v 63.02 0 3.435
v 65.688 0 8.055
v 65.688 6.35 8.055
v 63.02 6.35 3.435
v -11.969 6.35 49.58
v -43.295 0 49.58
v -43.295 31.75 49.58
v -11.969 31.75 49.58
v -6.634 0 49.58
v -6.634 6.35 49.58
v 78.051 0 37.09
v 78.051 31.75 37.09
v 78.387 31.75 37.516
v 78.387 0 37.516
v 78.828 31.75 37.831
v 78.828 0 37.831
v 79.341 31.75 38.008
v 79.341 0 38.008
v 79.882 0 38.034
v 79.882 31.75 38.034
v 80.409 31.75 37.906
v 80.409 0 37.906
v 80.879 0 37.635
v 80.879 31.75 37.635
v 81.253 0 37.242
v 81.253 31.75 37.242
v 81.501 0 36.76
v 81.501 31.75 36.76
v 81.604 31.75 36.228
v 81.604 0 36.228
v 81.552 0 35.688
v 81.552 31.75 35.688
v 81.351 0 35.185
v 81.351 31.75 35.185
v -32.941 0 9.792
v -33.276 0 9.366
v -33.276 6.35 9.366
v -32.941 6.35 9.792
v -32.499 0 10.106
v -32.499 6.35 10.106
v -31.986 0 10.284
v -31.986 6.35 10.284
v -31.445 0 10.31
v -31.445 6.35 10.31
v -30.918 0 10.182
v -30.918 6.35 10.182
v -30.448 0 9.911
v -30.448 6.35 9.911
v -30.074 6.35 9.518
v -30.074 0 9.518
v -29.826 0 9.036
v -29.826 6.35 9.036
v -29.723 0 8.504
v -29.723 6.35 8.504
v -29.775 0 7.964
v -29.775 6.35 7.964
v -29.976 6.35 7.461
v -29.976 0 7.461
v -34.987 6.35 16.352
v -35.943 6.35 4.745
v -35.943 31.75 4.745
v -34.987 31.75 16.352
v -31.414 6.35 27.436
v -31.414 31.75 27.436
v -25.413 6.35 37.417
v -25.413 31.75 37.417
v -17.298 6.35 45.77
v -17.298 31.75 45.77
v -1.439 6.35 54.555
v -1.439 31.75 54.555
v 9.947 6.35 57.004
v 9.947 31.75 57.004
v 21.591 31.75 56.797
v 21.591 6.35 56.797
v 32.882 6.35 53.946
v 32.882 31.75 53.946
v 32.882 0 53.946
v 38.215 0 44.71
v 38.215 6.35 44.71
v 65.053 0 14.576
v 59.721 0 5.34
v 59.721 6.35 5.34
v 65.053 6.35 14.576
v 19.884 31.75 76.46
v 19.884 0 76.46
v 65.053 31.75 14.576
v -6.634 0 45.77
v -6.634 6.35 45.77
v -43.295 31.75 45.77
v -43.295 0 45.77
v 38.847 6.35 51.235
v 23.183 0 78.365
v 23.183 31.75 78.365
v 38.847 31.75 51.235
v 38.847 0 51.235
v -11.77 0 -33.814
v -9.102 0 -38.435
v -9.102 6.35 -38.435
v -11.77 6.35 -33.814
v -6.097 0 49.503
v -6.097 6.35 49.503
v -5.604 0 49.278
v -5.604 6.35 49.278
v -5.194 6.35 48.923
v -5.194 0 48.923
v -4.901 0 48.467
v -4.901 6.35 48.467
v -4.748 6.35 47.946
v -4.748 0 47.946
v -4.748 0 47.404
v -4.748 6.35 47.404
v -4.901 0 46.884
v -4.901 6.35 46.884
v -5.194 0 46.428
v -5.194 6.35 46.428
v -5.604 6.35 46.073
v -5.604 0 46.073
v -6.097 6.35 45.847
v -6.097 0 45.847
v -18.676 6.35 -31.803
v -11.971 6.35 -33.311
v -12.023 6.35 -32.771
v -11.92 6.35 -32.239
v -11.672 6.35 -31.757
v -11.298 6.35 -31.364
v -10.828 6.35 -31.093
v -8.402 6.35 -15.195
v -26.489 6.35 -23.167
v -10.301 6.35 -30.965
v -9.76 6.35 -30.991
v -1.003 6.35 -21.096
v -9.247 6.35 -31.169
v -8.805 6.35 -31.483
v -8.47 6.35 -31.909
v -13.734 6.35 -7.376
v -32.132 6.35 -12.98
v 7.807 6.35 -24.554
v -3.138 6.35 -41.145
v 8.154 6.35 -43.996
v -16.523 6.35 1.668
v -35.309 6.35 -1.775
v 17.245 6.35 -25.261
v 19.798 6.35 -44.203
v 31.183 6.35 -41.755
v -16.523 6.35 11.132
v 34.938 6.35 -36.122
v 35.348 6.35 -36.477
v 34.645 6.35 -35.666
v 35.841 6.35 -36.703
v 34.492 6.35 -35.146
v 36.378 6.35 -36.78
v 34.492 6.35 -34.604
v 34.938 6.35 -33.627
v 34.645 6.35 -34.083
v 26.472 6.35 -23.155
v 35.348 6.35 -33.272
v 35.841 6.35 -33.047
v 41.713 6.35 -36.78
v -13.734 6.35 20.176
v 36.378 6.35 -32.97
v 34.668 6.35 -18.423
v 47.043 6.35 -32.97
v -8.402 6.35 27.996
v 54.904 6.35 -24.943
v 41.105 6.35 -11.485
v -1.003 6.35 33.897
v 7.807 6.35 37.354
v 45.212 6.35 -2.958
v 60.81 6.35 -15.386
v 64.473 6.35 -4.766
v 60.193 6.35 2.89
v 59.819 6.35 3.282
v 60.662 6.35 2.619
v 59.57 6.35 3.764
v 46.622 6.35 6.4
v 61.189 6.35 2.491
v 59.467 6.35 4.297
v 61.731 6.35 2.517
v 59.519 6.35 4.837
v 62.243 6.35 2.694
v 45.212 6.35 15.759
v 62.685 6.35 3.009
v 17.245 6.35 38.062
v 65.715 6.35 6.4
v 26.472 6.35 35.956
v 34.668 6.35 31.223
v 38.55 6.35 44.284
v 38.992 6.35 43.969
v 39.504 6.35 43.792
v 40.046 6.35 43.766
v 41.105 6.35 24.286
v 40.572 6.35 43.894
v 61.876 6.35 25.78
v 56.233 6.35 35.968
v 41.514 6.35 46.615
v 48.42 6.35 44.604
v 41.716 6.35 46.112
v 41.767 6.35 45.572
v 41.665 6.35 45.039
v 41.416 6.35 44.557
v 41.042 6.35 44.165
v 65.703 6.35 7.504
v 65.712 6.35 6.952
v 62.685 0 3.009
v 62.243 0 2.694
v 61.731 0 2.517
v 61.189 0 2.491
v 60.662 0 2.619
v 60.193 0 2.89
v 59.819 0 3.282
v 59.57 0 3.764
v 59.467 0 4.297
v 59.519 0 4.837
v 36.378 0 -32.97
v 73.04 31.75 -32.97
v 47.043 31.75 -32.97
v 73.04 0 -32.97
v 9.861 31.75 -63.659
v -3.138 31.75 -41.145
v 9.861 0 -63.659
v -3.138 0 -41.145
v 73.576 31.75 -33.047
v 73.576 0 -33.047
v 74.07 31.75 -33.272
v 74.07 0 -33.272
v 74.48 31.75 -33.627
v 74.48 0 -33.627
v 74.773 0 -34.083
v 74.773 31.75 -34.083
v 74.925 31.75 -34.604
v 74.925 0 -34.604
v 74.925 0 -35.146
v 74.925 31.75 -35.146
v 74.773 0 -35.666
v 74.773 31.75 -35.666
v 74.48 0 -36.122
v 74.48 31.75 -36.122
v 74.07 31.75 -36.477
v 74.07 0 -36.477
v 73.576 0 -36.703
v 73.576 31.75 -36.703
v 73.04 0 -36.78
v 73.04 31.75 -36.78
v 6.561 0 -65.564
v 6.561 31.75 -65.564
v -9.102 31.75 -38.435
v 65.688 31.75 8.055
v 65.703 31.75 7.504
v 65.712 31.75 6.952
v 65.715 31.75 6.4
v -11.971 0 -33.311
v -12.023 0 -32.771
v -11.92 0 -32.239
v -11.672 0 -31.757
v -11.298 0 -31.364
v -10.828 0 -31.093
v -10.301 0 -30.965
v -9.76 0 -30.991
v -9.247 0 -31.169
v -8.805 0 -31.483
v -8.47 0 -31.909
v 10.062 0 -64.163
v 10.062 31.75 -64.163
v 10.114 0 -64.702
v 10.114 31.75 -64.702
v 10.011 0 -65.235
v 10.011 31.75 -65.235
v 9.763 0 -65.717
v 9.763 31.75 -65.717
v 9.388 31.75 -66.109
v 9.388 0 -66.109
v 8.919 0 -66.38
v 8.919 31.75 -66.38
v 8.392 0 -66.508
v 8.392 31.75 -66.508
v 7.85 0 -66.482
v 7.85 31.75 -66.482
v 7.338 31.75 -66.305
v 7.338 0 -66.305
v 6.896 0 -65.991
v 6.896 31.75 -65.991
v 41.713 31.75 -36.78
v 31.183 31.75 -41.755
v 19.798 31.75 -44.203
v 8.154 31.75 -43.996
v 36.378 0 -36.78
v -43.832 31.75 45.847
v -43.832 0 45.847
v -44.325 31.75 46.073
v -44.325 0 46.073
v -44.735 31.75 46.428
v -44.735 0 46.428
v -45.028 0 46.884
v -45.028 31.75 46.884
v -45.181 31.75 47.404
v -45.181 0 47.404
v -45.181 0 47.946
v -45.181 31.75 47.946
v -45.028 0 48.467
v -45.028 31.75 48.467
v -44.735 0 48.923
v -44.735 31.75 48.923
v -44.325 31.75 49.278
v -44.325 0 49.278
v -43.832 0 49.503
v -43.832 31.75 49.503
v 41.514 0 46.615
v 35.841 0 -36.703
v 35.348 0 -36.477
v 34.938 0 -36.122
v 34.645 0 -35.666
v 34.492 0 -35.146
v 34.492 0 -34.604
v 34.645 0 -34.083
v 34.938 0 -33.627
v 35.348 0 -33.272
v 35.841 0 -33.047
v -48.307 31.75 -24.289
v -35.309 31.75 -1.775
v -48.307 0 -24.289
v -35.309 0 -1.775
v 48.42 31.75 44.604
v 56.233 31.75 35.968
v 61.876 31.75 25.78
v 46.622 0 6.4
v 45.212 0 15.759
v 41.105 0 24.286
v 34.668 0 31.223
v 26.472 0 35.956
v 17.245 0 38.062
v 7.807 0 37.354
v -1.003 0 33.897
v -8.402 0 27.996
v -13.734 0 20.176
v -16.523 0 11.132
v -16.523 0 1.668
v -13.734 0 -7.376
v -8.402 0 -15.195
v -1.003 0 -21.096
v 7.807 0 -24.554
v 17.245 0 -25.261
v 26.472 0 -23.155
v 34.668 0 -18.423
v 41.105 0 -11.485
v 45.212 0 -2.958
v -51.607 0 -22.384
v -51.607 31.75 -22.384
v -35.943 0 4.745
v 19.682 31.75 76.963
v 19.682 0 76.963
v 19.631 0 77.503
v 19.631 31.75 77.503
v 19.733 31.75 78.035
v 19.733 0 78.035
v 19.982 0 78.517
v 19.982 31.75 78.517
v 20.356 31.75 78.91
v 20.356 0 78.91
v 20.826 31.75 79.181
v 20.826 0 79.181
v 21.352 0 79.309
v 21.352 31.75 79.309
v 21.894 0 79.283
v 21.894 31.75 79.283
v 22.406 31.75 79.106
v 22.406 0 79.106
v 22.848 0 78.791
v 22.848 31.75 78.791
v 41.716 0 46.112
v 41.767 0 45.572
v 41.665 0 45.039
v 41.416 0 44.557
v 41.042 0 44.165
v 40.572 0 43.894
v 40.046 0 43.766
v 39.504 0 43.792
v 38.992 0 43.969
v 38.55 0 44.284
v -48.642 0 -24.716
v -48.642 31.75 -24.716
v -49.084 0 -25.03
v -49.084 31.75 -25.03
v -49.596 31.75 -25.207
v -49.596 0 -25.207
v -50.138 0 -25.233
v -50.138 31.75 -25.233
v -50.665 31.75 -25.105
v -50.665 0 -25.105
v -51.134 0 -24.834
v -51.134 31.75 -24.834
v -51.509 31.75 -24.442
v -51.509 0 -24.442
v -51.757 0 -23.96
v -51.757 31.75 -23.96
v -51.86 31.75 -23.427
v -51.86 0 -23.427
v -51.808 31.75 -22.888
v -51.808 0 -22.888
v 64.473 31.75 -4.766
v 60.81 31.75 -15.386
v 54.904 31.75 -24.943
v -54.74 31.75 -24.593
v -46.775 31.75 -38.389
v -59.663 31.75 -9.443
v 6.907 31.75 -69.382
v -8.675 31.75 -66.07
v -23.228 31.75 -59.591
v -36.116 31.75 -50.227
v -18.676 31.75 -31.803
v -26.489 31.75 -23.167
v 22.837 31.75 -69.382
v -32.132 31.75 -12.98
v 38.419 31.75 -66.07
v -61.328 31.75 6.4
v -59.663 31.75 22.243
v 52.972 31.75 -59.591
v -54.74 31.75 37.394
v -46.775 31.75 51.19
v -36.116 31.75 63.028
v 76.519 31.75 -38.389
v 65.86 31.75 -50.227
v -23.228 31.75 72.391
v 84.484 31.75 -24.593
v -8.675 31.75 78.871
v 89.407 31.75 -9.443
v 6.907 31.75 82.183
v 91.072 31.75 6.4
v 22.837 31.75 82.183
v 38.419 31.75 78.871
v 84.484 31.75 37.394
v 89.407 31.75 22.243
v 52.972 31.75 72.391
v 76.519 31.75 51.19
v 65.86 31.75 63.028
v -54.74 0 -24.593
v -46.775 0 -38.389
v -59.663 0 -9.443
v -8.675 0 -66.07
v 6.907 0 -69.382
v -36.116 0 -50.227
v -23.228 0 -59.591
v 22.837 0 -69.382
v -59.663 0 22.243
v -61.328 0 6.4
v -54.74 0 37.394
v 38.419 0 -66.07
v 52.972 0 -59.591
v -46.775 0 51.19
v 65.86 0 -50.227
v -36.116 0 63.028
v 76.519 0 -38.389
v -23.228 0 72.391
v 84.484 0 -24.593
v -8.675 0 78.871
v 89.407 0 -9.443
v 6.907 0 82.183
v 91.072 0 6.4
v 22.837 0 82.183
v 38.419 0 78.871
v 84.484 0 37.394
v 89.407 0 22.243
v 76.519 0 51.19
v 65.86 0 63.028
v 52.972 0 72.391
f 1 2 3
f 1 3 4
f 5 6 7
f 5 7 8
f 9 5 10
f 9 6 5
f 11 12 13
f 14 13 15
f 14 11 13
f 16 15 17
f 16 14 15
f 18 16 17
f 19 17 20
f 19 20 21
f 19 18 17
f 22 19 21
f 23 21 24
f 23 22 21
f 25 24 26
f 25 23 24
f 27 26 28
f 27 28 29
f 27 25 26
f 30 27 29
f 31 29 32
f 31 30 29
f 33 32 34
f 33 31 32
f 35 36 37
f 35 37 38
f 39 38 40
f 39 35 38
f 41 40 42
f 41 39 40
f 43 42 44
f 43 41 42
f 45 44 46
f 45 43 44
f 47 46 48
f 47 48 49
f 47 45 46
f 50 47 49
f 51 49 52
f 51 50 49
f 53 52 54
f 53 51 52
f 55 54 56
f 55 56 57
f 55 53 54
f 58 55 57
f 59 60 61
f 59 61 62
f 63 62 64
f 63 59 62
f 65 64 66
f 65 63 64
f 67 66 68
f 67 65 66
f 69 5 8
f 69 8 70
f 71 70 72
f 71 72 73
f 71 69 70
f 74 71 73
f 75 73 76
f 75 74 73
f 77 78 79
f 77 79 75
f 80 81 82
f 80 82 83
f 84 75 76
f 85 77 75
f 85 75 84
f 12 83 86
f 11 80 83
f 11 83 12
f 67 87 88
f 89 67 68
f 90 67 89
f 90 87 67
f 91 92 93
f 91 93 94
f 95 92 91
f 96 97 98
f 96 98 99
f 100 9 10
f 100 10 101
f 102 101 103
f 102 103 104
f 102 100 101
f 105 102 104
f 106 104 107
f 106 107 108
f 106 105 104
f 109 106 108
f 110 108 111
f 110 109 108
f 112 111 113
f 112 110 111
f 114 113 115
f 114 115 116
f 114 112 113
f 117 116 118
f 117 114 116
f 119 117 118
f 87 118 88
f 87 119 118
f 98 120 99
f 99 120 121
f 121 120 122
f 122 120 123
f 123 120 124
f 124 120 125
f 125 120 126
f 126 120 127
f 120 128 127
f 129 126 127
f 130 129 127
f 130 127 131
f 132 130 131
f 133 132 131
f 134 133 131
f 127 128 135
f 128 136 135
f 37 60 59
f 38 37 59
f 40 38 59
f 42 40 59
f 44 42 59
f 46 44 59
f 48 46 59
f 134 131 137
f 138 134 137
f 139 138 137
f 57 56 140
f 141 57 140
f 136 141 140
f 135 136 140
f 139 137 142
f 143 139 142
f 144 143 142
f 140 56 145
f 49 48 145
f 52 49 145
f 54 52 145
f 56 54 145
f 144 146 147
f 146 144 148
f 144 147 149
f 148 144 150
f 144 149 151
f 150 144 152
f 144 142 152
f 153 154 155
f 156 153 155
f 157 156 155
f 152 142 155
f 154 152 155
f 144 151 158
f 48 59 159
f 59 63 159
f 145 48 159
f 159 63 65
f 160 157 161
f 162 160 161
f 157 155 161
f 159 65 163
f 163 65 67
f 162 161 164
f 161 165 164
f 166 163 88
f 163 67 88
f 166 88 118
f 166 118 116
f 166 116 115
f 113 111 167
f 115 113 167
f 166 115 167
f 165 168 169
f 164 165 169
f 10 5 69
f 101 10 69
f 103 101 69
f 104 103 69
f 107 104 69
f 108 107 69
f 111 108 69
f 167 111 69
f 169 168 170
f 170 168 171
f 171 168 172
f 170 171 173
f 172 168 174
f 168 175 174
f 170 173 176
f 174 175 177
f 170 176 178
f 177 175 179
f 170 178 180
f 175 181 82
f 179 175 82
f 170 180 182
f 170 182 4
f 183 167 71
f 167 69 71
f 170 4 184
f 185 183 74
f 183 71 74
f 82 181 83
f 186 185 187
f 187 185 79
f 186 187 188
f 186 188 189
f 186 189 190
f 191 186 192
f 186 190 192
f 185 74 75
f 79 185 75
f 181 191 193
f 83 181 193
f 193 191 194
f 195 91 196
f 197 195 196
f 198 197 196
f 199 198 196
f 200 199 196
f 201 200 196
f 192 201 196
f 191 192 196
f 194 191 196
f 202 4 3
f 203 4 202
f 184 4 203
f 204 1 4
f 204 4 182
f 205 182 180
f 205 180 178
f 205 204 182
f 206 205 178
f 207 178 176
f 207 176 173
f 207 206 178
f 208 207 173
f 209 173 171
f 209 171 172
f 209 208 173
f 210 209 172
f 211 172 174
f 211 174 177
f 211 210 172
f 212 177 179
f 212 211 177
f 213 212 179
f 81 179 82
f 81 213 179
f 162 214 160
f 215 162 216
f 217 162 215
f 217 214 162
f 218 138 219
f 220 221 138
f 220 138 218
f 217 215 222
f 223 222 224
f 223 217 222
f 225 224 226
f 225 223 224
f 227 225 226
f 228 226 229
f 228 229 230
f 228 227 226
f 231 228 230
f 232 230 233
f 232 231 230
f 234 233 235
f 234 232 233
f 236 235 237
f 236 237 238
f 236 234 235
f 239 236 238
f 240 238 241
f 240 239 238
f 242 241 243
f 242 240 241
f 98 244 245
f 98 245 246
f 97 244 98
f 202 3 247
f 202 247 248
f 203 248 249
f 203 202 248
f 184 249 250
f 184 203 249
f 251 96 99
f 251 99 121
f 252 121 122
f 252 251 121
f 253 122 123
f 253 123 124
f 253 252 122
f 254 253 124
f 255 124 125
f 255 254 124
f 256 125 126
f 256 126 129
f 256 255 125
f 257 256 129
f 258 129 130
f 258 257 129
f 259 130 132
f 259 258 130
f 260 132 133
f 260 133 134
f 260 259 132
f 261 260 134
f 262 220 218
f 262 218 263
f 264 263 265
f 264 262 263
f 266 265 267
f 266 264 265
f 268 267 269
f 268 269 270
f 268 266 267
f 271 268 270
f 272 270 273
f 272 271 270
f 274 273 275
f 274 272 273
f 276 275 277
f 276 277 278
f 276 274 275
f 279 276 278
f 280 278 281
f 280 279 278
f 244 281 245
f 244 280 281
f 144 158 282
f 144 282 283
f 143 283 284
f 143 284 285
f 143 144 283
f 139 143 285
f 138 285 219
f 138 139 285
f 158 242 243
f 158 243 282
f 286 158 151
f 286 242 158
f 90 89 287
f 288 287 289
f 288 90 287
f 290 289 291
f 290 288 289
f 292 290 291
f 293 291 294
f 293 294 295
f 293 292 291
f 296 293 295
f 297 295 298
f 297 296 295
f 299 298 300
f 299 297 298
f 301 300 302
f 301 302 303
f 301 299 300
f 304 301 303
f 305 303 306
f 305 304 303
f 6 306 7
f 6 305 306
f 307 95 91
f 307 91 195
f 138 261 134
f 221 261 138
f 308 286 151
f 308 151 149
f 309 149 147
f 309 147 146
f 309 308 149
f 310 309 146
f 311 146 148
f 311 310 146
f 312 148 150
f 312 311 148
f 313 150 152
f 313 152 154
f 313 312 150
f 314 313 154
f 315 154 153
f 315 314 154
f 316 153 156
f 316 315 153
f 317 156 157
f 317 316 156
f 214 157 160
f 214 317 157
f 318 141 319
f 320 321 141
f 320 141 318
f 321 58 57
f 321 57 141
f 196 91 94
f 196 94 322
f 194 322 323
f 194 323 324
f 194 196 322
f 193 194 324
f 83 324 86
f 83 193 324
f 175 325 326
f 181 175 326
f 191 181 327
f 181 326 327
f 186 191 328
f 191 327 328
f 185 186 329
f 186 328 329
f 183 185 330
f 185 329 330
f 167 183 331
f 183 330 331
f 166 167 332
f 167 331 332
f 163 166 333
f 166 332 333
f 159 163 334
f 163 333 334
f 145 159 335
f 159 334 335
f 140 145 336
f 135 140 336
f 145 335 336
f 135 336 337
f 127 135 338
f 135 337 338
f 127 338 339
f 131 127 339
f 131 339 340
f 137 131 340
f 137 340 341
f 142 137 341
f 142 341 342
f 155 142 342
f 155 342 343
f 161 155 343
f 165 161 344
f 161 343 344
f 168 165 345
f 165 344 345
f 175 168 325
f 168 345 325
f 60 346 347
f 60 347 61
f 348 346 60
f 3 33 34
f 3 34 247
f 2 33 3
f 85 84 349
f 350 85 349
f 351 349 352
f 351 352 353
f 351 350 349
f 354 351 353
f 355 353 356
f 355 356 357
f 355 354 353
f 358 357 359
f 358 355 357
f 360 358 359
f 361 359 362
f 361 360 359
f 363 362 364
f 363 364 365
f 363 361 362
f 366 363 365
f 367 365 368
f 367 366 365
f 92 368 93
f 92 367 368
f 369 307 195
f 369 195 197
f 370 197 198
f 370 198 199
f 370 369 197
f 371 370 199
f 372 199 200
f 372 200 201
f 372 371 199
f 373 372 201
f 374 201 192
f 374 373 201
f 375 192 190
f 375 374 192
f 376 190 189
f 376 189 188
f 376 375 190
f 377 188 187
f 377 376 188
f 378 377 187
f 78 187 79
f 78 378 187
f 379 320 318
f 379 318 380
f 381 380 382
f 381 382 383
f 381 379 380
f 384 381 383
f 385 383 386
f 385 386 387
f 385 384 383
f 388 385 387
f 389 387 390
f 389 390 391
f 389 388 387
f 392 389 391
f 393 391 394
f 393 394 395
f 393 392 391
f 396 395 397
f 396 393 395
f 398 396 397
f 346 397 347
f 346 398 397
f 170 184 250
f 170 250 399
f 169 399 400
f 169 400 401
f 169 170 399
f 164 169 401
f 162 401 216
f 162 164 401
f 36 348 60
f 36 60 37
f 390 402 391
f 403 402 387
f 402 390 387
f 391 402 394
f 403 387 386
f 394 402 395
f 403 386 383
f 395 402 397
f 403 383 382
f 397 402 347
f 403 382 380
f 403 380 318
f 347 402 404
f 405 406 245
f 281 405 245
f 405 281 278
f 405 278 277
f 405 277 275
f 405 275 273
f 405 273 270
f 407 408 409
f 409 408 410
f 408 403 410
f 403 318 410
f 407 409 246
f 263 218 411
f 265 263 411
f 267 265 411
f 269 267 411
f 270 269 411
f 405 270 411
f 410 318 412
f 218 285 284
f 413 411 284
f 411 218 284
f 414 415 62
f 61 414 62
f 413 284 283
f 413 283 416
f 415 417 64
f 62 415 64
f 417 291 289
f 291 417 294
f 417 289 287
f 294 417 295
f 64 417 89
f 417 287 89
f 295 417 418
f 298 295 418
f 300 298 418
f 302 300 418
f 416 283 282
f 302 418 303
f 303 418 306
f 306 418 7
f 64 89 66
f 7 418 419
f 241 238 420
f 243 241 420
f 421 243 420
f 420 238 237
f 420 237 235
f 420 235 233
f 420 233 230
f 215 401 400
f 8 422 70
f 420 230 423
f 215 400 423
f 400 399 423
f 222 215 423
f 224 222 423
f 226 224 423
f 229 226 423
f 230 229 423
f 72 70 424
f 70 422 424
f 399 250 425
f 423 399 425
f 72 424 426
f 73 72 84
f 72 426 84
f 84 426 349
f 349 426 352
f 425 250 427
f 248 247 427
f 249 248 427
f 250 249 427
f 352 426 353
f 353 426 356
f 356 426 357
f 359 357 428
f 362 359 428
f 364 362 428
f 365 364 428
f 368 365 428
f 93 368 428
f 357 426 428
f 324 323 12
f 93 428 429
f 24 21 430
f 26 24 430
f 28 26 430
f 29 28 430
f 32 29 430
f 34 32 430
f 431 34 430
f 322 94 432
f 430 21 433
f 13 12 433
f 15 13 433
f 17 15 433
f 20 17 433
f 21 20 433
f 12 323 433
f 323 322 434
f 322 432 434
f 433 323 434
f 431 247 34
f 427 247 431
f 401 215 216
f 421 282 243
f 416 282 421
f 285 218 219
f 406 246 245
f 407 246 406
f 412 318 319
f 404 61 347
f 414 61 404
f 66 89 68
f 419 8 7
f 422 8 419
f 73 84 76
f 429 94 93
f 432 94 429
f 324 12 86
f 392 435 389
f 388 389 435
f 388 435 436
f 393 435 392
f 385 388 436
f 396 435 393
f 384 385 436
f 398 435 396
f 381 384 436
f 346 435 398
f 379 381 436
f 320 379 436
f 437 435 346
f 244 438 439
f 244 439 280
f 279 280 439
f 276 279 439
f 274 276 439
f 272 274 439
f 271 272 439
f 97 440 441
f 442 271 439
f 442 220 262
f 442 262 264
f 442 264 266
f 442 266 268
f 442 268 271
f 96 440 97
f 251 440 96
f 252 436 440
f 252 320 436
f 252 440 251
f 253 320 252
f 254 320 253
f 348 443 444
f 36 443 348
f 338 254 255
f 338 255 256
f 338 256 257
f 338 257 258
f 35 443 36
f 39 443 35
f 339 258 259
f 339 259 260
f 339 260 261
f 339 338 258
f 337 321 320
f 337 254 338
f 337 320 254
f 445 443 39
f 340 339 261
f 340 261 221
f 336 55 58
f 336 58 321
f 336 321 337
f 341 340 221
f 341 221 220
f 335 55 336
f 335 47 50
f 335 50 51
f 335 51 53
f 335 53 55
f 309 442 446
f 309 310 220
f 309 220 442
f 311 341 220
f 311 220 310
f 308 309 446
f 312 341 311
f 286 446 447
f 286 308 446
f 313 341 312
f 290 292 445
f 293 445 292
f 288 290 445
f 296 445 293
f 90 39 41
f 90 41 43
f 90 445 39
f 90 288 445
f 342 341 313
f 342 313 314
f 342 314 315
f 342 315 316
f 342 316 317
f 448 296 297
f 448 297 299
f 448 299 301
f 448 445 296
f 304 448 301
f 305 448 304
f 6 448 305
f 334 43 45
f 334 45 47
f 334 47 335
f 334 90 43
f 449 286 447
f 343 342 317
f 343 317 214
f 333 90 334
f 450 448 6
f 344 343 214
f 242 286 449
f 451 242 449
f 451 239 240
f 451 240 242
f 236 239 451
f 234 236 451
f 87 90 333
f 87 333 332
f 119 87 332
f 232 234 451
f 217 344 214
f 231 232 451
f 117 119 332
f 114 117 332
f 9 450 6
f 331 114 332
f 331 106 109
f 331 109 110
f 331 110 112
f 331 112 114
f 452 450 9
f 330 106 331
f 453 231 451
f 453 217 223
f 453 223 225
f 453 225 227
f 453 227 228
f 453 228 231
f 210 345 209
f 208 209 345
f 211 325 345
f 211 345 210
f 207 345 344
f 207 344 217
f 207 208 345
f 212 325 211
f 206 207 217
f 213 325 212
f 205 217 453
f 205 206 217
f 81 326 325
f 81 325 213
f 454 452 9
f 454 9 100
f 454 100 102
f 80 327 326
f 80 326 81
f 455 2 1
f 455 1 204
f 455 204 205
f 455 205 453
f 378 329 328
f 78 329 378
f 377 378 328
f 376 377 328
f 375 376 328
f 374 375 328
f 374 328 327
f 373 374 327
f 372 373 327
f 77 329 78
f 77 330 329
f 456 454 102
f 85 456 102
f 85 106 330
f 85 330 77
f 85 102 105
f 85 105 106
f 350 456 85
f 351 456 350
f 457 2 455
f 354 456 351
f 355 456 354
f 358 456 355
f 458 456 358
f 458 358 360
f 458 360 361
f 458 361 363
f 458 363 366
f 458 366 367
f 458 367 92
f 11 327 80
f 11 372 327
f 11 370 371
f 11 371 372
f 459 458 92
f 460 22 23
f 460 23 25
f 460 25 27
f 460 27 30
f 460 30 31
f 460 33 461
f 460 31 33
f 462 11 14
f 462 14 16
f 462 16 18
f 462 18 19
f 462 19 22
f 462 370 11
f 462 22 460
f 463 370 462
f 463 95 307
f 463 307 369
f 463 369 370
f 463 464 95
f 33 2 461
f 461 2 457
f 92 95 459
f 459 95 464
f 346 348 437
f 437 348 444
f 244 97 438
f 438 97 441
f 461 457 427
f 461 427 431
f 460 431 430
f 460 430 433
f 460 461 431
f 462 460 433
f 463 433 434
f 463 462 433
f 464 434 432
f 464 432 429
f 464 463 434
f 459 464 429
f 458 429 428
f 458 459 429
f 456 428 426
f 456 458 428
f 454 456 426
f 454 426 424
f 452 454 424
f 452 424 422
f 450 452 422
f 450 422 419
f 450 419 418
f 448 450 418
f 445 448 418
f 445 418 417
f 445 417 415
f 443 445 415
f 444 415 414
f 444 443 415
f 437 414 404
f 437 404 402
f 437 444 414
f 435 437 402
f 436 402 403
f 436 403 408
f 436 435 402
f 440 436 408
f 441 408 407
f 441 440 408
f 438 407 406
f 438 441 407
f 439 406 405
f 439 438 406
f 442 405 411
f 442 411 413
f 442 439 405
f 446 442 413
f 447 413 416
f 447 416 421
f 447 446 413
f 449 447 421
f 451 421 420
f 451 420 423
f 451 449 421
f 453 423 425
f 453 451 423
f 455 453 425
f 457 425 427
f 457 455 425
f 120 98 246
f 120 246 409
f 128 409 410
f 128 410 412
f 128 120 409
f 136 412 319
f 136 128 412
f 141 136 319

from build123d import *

# Parameters (mm, degrees)
F0_R     = 31.75
F1_DEPTH = 6.35
F0_R_2   = 76.2
F0_R_3   = 74.4988936807
F2_DEPTH = 31.75


# Not quite as in the source:
# - a feature names something its author has since deleted; it is built from what else it names


with BuildPart() as f1:
    # F0 (on Front) → F1 (new body)
    with BuildSketch(Plane.XZ):
        with BuildLine():
            ThreePointArc((47.0428302523, -32.9697150499), (60.8100722022, -15.3863528649), (65.7145588579, 6.4002849501))
            ThreePointArc((65.7145588579, 6.4002849501), (65.7078231144, 7.227857987), (65.6876176686, 8.0552117454))
            Line((65.6876176686, 8.0552117454), (63.0200884494, 3.4349156071))
            ThreePointArc((63.0200884494, 3.4349156071), (60.4178100552, 2.7376372129), (59.720531661, 5.3399156071))
            Line((59.720531661, 5.3399156071), (65.0529232684, 14.5758887971))
            ThreePointArc((65.0529232684, 14.5758887971), (56.2331130755, 35.9675096944), (38.8466881833, 51.2352117455))
            Line((38.8466881833, 51.2352117455), (41.5142174026, 46.6149156071))
            ThreePointArc((41.5142174026, 46.6149156071), (40.8169390084, 44.0126372129), (38.2146606142, 44.7099156071))
            Line((38.2146606142, 44.7099156071), (32.8822690066, 53.9458887971))
            ThreePointArc((32.8822690066, 53.9458887971), (9.9466767851, 57.0035195621), (-11.9687534946, 49.5802849501))
            Line((-11.9687534946, 49.5802849501), (-6.6336950562, 49.5802849501))
            ThreePointArc((-6.6336950562, 49.5802849501), (-4.7286950562, 47.6752849501), (-6.6336950562, 45.7702849501))
            Line((-6.6336950562, 45.7702849501), (-17.2984782711, 45.7702849501))
            ThreePointArc((-17.2984782711, 45.7702849501), (-31.4142602999, 27.4362948179), (-35.9432656874, 4.7453581548))
            Line((-35.9432656874, 4.7453581548), (-33.2757364682, 9.3656542931))
            ThreePointArc((-33.2757364682, 9.3656542931), (-30.673458074, 10.0629326873), (-29.9761796798, 7.4606542931))
            Line((-29.9761796798, 7.4606542931), (-35.3085712873, -1.7753188969))
            ThreePointArc((-35.3085712873, -1.7753188969), (-26.4887610944, -23.1669397942), (-9.1023362022, -38.4346418453))
            Line((-9.1023362022, -38.4346418453), (-11.7698654214, -33.8143457069))
            ThreePointArc((-11.7698654214, -33.8143457069), (-11.0725870272, -31.2120673127), (-8.470308633, -31.9093457069))
            Line((-8.470308633, -31.9093457069), (-3.1379170255, -41.1453188969))
            ThreePointArc((-3.1379170255, -41.1453188969), (19.797675196, -44.202949662), (41.7131054758, -36.7797150499))
            Line((41.7131054758, -36.7797150499), (36.3780470374, -36.7797150499))
            ThreePointArc((36.3780470374, -36.7797150499), (34.4730470374, -34.8747150499), (36.3780470374, -32.9697150499))
            Line((36.3780470374, -32.9697150499), (47.0428302523, -32.9697150499))
        make_face()
        with Locations((14.8721759906, 6.4002849501)):
            Circle(F0_R, mode=Mode.SUBTRACT)
    extrude(amount=-F1_DEPTH)

    # F0 (on Front) → F2 (join)
    with BuildSketch(Plane.XZ):
        with Locations((14.8721759906, 6.4002849501)):
            Circle(F0_R_2)
        with Locations((14.8721759906, 6.4002849501)):
            Circle(F0_R_3, mode=Mode.SUBTRACT)
        with Locations((14.8721759906, 6.4002849501)):
            Circle(F0_R_3)
        with BuildLine():
            ThreePointArc((65.6876176686, 8.0552117454), (65.7078231144, 7.227857987), (65.7145588579, 6.4002849501))
            ThreePointArc((65.7145588579, 6.4002849501), (60.8100722022, -15.3863528649), (47.0428302523, -32.9697150499))
            Line((47.0428302523, -32.9697150499), (73.0397974374, -32.9697150499))
            ThreePointArc((73.0397974374, -32.9697150499), (74.9447974374, -34.8747150499), (73.0397974374, -36.7797150499))
            Line((73.0397974374, -36.7797150499), (41.7131054758, -36.7797150499))
            ThreePointArc((41.7131054758, -36.7797150499), (19.797675196, -44.202949662), (-3.1379170255, -41.1453188969))
            Line((-3.1379170255, -41.1453188969), (9.860566567, -63.6593529005))
            ThreePointArc((9.860566567, -63.6593529005), (9.1632881728, -66.2616312948), (6.5610097786, -65.5643529005))
            Line((6.5610097786, -65.5643529005), (-9.1023362022, -38.4346418453))
            ThreePointArc((-9.1023362022, -38.4346418453), (-26.4887610944, -23.1669397942), (-35.3085712873, -1.7753188969))
            Line((-35.3085712873, -1.7753188969), (-48.3070548798, -24.2893529005))
            ThreePointArc((-48.3070548798, -24.2893529005), (-50.909333274, -24.9866312948), (-51.6066116682, -22.3843529005))
            Line((-51.6066116682, -22.3843529005), (-35.9432656874, 4.7453581548))
            ThreePointArc((-35.9432656874, 4.7453581548), (-31.4142602999, 27.4362948179), (-17.2984782711, 45.7702849501))
            Line((-17.2984782711, 45.7702849501), (-43.2954454562, 45.7702849501))
            ThreePointArc((-43.2954454562, 45.7702849501), (-45.2004454562, 47.6752849501), (-43.2954454562, 49.5802849501))
            Line((-43.2954454562, 49.5802849501), (-11.9687534946, 49.5802849501))
            ThreePointArc((-11.9687534946, 49.5802849501), (9.9466767851, 57.0035195621), (32.8822690066, 53.9458887971))
            Line((32.8822690066, 53.9458887971), (19.8837854141, 76.4599228007))
            ThreePointArc((19.8837854141, 76.4599228007), (20.5810638083, 79.0622011949), (23.1833422025, 78.3649228007))
            Line((23.1833422025, 78.3649228007), (38.8466881833, 51.2352117455))
            ThreePointArc((38.8466881833, 51.2352117455), (56.2331130755, 35.9675096944), (65.0529232684, 14.5758887971))
            Line((65.0529232684, 14.5758887971), (78.051406861, 37.0899228007))
            ThreePointArc((78.051406861, 37.0899228007), (80.6536852552, 37.7872011949), (81.3509636494, 35.1849228007))
            Line((81.3509636494, 35.1849228007), (65.6876176686, 8.0552117454))
        make_face(mode=Mode.SUBTRACT)
    extrude(amount=-F2_DEPTH)


solid = f1.part
